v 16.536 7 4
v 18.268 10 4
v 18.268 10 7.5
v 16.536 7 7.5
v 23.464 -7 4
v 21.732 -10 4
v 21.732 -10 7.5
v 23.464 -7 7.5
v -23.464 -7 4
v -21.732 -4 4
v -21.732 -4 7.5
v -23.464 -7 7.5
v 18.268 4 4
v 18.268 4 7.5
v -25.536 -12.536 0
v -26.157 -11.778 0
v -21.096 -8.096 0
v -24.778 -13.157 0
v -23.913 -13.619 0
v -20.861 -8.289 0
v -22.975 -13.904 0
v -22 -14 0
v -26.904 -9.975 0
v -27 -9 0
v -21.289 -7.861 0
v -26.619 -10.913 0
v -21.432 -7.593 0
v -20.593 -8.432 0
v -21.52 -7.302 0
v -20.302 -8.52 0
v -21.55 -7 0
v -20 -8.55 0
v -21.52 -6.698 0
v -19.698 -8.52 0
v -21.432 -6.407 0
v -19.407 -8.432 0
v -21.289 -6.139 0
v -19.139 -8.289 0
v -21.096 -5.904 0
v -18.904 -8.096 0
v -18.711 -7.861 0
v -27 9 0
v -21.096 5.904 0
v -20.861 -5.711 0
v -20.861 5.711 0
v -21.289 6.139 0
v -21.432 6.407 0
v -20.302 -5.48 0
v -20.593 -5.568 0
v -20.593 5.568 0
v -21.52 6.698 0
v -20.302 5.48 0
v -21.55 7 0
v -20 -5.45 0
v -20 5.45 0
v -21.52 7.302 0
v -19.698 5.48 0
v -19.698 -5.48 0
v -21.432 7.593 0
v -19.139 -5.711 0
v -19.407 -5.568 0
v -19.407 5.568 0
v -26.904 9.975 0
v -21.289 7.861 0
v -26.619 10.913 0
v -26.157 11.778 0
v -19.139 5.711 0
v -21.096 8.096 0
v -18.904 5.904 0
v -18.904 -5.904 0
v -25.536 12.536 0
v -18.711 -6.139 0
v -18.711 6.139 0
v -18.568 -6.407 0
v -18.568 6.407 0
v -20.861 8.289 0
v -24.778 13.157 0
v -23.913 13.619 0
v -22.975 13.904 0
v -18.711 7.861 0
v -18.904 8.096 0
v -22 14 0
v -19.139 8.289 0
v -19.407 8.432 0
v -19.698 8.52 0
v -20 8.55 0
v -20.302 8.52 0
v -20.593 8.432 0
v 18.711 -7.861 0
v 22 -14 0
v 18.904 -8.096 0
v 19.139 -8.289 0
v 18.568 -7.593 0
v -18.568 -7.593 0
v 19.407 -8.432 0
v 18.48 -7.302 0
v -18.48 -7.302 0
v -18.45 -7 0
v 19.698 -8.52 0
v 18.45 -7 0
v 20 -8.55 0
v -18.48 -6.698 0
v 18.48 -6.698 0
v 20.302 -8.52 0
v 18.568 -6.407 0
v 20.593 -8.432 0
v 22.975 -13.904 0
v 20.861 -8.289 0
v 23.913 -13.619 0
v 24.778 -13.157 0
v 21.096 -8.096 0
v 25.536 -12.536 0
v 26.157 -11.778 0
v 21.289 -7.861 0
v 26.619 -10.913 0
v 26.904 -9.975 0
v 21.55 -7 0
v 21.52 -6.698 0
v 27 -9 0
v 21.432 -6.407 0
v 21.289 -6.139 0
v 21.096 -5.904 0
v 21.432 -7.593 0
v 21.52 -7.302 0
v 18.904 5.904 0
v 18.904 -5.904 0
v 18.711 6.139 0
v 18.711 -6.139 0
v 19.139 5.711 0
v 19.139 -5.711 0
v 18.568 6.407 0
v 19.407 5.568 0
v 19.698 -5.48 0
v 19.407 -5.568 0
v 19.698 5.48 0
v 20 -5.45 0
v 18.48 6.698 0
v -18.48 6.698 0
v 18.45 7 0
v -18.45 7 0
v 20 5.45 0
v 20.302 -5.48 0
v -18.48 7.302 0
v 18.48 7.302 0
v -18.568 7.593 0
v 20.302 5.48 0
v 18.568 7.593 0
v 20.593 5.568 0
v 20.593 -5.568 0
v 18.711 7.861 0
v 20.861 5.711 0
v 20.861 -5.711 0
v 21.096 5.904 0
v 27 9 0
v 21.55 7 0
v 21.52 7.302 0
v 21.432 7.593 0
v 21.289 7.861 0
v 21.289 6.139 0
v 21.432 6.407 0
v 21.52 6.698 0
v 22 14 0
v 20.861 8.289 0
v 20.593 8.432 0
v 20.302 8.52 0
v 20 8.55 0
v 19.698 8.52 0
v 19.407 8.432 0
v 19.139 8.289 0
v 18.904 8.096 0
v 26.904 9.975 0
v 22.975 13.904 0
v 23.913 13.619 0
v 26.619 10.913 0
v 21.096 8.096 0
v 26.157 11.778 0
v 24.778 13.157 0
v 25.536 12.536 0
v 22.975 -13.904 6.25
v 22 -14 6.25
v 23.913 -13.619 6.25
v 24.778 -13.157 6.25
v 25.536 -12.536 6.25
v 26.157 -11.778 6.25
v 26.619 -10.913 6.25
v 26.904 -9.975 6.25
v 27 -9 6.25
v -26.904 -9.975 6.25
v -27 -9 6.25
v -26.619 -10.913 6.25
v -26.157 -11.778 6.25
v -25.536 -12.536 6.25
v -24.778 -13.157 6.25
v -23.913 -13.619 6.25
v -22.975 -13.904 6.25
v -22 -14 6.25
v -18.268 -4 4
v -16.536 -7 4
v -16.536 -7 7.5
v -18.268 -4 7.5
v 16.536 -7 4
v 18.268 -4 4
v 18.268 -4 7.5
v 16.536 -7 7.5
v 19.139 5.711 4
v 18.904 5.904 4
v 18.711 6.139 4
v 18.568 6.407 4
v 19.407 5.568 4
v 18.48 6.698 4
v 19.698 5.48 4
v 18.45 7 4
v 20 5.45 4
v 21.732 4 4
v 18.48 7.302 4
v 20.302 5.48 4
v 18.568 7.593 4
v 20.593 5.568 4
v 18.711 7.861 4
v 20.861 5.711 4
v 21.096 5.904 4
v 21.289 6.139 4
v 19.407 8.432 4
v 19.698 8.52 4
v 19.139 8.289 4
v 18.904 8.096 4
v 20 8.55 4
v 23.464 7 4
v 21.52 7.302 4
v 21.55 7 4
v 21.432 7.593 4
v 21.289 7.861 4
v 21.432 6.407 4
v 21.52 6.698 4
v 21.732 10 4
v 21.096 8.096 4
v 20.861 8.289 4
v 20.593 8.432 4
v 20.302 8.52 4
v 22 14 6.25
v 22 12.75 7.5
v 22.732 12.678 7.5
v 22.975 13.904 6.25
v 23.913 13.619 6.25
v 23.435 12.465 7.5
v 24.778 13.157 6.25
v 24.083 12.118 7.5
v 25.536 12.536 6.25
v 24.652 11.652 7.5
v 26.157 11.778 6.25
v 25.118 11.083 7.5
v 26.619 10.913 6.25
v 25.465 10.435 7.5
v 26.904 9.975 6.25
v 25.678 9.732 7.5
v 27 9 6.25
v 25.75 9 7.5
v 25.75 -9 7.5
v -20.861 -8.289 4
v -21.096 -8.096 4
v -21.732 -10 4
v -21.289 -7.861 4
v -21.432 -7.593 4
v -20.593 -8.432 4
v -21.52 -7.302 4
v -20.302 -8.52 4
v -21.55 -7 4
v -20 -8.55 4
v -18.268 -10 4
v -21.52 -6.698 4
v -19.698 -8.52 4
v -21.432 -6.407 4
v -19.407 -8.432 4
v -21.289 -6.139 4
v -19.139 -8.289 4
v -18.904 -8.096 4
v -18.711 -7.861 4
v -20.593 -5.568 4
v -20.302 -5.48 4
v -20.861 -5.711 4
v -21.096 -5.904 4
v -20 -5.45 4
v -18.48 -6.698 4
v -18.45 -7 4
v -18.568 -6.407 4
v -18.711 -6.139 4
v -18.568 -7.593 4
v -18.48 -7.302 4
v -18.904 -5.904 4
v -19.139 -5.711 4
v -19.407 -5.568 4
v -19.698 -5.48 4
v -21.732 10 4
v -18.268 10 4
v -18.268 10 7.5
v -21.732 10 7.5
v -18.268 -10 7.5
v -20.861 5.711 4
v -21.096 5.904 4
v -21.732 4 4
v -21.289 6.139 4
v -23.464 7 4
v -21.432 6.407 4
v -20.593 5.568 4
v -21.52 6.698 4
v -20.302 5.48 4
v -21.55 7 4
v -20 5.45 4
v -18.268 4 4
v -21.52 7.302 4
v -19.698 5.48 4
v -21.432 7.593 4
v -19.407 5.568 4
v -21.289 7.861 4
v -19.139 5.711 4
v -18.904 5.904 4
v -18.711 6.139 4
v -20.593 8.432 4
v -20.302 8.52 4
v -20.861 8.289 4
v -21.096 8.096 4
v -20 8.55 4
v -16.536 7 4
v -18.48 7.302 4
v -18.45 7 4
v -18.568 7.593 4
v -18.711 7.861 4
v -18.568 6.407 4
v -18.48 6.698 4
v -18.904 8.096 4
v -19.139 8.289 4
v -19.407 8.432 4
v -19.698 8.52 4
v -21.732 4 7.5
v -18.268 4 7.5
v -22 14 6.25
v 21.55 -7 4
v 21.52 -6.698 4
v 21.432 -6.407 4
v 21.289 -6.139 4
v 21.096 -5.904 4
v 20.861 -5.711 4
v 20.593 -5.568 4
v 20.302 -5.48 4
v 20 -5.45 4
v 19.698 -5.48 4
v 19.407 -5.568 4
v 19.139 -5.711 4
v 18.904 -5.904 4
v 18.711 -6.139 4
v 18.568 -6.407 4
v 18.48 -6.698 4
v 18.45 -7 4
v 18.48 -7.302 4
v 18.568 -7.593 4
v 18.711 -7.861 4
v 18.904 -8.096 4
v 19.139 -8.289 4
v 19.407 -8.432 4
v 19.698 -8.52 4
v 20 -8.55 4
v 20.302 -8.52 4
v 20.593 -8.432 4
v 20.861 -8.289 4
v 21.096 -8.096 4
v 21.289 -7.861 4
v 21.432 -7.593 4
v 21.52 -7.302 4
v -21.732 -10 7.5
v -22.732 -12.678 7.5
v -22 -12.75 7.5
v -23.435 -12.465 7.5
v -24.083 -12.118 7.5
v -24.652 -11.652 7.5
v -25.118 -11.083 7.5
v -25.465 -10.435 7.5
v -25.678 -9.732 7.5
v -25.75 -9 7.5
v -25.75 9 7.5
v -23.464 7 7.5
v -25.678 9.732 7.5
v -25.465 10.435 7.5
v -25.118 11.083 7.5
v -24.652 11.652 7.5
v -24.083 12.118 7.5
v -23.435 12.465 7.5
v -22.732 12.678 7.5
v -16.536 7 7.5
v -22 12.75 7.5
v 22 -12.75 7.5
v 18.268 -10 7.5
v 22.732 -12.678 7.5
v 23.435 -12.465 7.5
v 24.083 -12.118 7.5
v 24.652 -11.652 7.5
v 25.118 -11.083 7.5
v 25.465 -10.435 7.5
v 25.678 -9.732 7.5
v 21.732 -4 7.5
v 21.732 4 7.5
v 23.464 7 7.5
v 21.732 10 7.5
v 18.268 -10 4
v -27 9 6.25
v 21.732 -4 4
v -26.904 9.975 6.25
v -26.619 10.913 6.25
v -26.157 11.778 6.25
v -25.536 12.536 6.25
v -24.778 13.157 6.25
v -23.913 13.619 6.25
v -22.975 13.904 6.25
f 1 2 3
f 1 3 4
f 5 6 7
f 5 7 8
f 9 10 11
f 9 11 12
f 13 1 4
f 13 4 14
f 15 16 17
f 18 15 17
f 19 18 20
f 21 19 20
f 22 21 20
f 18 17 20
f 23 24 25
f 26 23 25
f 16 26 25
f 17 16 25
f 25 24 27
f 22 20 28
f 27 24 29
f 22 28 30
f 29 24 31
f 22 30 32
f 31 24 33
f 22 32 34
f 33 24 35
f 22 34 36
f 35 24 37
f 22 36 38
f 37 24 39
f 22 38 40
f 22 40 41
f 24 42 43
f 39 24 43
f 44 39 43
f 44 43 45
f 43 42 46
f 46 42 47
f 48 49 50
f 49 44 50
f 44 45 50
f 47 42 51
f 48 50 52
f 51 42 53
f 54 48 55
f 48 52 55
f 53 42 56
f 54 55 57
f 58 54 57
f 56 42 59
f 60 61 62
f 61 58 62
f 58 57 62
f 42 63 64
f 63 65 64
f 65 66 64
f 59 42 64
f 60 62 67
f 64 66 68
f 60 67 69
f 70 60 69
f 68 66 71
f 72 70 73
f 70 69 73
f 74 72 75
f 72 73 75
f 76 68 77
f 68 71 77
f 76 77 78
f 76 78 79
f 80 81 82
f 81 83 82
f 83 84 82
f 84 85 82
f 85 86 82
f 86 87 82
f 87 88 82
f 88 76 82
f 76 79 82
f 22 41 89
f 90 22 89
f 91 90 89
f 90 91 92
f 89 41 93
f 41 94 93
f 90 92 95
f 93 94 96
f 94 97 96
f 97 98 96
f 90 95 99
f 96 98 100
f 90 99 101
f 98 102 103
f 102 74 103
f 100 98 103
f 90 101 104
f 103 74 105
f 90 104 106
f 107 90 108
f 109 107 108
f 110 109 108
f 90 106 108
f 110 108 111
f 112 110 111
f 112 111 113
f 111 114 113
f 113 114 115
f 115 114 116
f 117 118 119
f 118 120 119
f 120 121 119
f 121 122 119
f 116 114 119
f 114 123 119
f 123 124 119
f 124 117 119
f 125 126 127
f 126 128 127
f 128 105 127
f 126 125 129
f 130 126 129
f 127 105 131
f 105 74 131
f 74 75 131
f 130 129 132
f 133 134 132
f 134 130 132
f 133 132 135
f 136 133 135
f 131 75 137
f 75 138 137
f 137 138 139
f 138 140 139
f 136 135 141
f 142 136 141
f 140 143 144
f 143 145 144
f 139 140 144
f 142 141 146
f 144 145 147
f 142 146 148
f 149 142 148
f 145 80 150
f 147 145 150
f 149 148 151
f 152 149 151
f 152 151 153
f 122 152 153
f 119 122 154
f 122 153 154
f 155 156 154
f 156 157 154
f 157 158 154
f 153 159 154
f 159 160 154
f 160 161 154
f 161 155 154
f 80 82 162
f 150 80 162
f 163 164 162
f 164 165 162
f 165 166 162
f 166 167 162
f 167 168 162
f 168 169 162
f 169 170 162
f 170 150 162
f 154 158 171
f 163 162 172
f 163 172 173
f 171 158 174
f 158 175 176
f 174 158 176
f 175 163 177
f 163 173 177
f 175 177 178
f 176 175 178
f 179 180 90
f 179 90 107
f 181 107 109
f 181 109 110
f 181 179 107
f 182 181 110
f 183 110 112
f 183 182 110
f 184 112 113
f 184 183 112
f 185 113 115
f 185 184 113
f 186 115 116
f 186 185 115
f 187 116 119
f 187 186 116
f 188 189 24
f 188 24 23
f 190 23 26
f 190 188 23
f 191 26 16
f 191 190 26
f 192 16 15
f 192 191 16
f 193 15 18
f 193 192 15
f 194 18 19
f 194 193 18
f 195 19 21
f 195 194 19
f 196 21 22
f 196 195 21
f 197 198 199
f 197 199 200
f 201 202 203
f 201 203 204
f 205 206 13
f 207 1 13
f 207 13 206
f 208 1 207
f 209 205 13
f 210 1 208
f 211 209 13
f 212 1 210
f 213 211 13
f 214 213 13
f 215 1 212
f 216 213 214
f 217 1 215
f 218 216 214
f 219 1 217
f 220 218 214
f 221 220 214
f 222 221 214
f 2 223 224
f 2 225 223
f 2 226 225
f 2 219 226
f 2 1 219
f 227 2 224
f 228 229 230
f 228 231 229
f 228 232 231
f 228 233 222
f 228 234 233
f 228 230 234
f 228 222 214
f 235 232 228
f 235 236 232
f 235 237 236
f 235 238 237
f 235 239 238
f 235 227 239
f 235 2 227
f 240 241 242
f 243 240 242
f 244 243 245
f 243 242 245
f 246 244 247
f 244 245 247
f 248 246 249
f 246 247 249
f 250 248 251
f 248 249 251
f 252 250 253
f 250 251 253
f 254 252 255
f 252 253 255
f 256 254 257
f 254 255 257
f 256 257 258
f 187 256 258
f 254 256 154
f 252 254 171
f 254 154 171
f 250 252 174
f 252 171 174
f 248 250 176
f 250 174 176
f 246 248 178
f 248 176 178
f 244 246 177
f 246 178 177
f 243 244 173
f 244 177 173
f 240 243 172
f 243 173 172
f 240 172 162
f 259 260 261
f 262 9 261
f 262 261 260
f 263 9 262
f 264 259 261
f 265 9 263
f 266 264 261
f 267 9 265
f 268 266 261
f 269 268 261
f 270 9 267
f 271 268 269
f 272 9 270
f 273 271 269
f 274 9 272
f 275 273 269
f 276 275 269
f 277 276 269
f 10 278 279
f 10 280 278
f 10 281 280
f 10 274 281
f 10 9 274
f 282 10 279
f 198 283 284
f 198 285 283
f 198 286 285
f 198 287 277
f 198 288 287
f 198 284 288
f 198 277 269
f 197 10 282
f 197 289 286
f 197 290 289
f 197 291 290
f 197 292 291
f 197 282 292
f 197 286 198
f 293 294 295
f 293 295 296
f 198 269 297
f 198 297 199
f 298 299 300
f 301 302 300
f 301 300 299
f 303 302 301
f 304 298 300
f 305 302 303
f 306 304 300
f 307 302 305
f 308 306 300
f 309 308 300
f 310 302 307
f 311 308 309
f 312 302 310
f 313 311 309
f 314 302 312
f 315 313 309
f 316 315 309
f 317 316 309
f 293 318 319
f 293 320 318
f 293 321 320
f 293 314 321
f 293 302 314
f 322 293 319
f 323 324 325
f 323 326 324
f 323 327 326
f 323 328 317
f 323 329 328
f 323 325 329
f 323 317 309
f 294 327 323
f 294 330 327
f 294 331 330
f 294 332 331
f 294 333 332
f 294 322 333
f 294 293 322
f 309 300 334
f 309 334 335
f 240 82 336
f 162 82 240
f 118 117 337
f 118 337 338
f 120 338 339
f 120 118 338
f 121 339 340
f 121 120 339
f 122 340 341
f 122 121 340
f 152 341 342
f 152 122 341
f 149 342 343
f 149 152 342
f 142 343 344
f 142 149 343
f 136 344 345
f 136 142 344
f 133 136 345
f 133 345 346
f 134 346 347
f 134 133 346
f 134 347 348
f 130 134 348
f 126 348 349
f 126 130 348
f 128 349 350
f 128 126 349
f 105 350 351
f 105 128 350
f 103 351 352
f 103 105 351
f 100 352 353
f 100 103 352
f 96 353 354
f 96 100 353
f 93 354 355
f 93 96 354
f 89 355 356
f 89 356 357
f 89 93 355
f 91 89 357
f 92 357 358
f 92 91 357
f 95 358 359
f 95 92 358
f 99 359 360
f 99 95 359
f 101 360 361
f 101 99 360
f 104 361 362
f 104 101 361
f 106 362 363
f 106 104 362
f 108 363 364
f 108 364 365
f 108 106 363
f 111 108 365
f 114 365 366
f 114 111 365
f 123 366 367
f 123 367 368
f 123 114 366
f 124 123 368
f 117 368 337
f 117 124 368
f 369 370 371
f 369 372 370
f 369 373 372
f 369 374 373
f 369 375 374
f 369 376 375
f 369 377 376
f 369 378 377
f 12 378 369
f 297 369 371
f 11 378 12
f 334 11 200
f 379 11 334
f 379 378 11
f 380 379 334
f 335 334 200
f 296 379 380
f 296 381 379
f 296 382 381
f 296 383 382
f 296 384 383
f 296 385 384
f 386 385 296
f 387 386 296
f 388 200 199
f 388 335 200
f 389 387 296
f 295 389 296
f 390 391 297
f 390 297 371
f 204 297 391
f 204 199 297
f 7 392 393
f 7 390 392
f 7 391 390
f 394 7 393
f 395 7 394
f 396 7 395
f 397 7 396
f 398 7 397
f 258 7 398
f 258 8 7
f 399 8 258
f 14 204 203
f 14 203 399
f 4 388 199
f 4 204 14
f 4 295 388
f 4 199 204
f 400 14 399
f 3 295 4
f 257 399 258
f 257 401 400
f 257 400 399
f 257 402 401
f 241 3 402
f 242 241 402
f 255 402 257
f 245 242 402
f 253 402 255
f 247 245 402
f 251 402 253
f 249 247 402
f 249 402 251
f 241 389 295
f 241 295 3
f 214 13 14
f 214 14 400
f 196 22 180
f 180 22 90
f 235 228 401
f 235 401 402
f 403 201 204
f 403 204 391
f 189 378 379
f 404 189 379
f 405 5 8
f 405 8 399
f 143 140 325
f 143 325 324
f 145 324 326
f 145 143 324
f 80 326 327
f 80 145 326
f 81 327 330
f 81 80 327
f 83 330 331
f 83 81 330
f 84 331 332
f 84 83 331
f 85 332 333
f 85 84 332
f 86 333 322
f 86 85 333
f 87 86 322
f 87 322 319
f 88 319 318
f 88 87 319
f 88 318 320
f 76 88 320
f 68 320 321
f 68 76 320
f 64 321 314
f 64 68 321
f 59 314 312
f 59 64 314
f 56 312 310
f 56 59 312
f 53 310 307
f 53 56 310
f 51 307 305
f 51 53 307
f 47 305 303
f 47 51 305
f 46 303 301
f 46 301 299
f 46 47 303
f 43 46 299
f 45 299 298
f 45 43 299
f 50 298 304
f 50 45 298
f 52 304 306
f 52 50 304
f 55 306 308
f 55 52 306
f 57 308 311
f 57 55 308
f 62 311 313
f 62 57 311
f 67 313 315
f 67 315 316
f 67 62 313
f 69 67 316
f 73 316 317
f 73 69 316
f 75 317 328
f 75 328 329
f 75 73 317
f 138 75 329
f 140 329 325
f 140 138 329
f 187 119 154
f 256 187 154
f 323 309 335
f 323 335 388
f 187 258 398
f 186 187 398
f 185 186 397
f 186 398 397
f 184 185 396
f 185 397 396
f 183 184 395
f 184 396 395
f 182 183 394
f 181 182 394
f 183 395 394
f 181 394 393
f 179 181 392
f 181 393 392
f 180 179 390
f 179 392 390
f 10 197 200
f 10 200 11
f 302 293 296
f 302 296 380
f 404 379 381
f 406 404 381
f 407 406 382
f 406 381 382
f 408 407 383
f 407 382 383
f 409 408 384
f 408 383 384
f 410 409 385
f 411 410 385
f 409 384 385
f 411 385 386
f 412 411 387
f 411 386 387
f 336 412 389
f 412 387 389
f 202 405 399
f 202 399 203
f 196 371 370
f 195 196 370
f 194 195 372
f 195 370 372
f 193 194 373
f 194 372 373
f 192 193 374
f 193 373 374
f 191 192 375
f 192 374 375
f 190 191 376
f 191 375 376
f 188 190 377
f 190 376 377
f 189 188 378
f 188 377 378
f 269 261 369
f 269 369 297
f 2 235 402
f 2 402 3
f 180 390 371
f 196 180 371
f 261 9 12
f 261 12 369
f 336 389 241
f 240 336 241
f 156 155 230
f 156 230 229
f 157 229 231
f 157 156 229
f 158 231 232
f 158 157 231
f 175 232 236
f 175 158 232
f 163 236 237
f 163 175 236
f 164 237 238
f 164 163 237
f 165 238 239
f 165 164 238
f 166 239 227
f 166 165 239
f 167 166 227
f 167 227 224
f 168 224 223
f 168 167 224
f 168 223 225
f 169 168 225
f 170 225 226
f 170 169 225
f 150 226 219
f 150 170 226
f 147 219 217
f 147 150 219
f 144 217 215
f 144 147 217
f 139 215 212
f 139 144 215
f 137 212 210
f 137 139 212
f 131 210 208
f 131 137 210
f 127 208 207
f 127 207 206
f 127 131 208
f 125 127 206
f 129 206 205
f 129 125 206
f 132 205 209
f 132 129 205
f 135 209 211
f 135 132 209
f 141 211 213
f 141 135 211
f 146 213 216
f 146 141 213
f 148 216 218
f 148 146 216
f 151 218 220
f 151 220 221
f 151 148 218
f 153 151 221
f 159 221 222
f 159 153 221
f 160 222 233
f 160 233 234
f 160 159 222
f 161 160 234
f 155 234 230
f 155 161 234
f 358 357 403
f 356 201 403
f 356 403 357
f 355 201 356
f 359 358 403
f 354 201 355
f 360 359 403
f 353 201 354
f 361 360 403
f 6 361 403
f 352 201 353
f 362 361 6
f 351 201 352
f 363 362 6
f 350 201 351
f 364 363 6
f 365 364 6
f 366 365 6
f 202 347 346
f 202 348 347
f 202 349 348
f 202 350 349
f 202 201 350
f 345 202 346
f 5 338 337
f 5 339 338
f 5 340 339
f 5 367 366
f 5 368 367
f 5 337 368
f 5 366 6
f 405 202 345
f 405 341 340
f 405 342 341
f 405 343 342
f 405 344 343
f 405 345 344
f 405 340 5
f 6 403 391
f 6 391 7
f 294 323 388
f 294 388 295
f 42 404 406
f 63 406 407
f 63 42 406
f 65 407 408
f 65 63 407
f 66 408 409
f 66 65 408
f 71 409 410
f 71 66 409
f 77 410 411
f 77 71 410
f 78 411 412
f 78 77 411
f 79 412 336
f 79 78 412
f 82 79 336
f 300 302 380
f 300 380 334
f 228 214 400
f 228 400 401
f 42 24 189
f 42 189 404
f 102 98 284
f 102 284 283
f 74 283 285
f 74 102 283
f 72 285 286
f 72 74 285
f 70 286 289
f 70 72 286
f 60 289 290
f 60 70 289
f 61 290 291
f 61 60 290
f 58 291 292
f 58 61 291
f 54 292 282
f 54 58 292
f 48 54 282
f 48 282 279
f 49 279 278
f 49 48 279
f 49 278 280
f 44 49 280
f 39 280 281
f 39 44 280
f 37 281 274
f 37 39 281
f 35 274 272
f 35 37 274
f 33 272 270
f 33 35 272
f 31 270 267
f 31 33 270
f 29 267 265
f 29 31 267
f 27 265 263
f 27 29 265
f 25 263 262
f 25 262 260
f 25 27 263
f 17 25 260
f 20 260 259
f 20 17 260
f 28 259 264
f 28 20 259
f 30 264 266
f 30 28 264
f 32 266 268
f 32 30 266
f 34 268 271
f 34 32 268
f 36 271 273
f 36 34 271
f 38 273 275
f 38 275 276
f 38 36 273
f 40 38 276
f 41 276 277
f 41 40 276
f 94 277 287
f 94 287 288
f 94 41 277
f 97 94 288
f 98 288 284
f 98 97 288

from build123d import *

# Parameters (mm, degrees)
BASE_W              = 54
BASE_H              = 28
BASE_R              = 1.55
BOSS_EXTRUDE1_DEPTH = 4
BOSS_EXTRUDE2_START = 4
BASE_3_W            = 54
BASE_3_H            = 28
BOSS_EXTRUDE2_DEPTH = 3.5
FILLET1_R           = 5
CHAMFER1_SIZE       = 1.25


with BuildPart() as part:
    # Base → Boss-Extrude1 (new body)
    with BuildSketch(Plane.XY):
        Rectangle(BASE_W, BASE_H)
        with Locations((-20, 7)):
            Circle(BASE_R, mode=Mode.SUBTRACT)
        with Locations((20, 7)):
            Circle(BASE_R, mode=Mode.SUBTRACT)
        with Locations((20, -7)):
            Circle(BASE_R, mode=Mode.SUBTRACT)
        with Locations((-20, -7)):
            Circle(BASE_R, mode=Mode.SUBTRACT)
    extrude(amount=BOSS_EXTRUDE1_DEPTH)

    # Base<3> → Boss-Extrude2 (add)
    with BuildSketch(Plane.XY.offset(BOSS_EXTRUDE2_START)):
        Rectangle(BASE_3_W, BASE_3_H)
        Polygon((-21.732050808, -10), (-18.267949192, -10), (-16.535898385, -7), (-18.267949192, -4), (-21.732050808, -4), (-23.464101615, -7), align=None, mode=Mode.SUBTRACT)
        Polygon((21.732050808, -10), (23.464101615, -7), (21.732050808, -4), (18.267949192, -4), (16.535898385, -7), (18.267949192, -10), align=None, mode=Mode.SUBTRACT)
        Polygon((21.732050808, 4), (23.464101615, 7), (21.732050808, 10), (18.267949192, 10), (16.535898385, 7), (18.267949192, 4), align=None, mode=Mode.SUBTRACT)
        Polygon((-18.267949192, 4), (-16.535898385, 7), (-18.267949192, 10), (-21.732050808, 10), (-23.464101615, 7), (-21.732050808, 4), align=None, mode=Mode.SUBTRACT)
    extrude(amount=BOSS_EXTRUDE2_DEPTH)

    # Fillet1
    fillet1_edges = [part.edges().sort_by_distance(p)[0] for p in [
        (27, 14, 3.75),
        (27, -14, 3.75),
        (-27, -14, 3.75),
        (-27, 14, 3.75),
    ]]
    fillet(fillet1_edges, radius=FILLET1_R)

    # Chamfer1
    chamfer1_edges = [part.edges().sort_by_distance(p)[0] for p in [
        (-27, 0, 7.5),
        (0, 14, 7.5),
        (0, -14, 7.5),
        (27, 0, 7.5),
        (-25.535533906, -12.535533906, 7.5),
        (25.535533906, -12.535533906, 7.5),
        (25.535533906, 12.535533906, 7.5),
        (-25.535533906, 12.535533906, 7.5),
    ]]
    chamfer(chamfer1_edges, length=CHAMFER1_SIZE)


solid = part.part
